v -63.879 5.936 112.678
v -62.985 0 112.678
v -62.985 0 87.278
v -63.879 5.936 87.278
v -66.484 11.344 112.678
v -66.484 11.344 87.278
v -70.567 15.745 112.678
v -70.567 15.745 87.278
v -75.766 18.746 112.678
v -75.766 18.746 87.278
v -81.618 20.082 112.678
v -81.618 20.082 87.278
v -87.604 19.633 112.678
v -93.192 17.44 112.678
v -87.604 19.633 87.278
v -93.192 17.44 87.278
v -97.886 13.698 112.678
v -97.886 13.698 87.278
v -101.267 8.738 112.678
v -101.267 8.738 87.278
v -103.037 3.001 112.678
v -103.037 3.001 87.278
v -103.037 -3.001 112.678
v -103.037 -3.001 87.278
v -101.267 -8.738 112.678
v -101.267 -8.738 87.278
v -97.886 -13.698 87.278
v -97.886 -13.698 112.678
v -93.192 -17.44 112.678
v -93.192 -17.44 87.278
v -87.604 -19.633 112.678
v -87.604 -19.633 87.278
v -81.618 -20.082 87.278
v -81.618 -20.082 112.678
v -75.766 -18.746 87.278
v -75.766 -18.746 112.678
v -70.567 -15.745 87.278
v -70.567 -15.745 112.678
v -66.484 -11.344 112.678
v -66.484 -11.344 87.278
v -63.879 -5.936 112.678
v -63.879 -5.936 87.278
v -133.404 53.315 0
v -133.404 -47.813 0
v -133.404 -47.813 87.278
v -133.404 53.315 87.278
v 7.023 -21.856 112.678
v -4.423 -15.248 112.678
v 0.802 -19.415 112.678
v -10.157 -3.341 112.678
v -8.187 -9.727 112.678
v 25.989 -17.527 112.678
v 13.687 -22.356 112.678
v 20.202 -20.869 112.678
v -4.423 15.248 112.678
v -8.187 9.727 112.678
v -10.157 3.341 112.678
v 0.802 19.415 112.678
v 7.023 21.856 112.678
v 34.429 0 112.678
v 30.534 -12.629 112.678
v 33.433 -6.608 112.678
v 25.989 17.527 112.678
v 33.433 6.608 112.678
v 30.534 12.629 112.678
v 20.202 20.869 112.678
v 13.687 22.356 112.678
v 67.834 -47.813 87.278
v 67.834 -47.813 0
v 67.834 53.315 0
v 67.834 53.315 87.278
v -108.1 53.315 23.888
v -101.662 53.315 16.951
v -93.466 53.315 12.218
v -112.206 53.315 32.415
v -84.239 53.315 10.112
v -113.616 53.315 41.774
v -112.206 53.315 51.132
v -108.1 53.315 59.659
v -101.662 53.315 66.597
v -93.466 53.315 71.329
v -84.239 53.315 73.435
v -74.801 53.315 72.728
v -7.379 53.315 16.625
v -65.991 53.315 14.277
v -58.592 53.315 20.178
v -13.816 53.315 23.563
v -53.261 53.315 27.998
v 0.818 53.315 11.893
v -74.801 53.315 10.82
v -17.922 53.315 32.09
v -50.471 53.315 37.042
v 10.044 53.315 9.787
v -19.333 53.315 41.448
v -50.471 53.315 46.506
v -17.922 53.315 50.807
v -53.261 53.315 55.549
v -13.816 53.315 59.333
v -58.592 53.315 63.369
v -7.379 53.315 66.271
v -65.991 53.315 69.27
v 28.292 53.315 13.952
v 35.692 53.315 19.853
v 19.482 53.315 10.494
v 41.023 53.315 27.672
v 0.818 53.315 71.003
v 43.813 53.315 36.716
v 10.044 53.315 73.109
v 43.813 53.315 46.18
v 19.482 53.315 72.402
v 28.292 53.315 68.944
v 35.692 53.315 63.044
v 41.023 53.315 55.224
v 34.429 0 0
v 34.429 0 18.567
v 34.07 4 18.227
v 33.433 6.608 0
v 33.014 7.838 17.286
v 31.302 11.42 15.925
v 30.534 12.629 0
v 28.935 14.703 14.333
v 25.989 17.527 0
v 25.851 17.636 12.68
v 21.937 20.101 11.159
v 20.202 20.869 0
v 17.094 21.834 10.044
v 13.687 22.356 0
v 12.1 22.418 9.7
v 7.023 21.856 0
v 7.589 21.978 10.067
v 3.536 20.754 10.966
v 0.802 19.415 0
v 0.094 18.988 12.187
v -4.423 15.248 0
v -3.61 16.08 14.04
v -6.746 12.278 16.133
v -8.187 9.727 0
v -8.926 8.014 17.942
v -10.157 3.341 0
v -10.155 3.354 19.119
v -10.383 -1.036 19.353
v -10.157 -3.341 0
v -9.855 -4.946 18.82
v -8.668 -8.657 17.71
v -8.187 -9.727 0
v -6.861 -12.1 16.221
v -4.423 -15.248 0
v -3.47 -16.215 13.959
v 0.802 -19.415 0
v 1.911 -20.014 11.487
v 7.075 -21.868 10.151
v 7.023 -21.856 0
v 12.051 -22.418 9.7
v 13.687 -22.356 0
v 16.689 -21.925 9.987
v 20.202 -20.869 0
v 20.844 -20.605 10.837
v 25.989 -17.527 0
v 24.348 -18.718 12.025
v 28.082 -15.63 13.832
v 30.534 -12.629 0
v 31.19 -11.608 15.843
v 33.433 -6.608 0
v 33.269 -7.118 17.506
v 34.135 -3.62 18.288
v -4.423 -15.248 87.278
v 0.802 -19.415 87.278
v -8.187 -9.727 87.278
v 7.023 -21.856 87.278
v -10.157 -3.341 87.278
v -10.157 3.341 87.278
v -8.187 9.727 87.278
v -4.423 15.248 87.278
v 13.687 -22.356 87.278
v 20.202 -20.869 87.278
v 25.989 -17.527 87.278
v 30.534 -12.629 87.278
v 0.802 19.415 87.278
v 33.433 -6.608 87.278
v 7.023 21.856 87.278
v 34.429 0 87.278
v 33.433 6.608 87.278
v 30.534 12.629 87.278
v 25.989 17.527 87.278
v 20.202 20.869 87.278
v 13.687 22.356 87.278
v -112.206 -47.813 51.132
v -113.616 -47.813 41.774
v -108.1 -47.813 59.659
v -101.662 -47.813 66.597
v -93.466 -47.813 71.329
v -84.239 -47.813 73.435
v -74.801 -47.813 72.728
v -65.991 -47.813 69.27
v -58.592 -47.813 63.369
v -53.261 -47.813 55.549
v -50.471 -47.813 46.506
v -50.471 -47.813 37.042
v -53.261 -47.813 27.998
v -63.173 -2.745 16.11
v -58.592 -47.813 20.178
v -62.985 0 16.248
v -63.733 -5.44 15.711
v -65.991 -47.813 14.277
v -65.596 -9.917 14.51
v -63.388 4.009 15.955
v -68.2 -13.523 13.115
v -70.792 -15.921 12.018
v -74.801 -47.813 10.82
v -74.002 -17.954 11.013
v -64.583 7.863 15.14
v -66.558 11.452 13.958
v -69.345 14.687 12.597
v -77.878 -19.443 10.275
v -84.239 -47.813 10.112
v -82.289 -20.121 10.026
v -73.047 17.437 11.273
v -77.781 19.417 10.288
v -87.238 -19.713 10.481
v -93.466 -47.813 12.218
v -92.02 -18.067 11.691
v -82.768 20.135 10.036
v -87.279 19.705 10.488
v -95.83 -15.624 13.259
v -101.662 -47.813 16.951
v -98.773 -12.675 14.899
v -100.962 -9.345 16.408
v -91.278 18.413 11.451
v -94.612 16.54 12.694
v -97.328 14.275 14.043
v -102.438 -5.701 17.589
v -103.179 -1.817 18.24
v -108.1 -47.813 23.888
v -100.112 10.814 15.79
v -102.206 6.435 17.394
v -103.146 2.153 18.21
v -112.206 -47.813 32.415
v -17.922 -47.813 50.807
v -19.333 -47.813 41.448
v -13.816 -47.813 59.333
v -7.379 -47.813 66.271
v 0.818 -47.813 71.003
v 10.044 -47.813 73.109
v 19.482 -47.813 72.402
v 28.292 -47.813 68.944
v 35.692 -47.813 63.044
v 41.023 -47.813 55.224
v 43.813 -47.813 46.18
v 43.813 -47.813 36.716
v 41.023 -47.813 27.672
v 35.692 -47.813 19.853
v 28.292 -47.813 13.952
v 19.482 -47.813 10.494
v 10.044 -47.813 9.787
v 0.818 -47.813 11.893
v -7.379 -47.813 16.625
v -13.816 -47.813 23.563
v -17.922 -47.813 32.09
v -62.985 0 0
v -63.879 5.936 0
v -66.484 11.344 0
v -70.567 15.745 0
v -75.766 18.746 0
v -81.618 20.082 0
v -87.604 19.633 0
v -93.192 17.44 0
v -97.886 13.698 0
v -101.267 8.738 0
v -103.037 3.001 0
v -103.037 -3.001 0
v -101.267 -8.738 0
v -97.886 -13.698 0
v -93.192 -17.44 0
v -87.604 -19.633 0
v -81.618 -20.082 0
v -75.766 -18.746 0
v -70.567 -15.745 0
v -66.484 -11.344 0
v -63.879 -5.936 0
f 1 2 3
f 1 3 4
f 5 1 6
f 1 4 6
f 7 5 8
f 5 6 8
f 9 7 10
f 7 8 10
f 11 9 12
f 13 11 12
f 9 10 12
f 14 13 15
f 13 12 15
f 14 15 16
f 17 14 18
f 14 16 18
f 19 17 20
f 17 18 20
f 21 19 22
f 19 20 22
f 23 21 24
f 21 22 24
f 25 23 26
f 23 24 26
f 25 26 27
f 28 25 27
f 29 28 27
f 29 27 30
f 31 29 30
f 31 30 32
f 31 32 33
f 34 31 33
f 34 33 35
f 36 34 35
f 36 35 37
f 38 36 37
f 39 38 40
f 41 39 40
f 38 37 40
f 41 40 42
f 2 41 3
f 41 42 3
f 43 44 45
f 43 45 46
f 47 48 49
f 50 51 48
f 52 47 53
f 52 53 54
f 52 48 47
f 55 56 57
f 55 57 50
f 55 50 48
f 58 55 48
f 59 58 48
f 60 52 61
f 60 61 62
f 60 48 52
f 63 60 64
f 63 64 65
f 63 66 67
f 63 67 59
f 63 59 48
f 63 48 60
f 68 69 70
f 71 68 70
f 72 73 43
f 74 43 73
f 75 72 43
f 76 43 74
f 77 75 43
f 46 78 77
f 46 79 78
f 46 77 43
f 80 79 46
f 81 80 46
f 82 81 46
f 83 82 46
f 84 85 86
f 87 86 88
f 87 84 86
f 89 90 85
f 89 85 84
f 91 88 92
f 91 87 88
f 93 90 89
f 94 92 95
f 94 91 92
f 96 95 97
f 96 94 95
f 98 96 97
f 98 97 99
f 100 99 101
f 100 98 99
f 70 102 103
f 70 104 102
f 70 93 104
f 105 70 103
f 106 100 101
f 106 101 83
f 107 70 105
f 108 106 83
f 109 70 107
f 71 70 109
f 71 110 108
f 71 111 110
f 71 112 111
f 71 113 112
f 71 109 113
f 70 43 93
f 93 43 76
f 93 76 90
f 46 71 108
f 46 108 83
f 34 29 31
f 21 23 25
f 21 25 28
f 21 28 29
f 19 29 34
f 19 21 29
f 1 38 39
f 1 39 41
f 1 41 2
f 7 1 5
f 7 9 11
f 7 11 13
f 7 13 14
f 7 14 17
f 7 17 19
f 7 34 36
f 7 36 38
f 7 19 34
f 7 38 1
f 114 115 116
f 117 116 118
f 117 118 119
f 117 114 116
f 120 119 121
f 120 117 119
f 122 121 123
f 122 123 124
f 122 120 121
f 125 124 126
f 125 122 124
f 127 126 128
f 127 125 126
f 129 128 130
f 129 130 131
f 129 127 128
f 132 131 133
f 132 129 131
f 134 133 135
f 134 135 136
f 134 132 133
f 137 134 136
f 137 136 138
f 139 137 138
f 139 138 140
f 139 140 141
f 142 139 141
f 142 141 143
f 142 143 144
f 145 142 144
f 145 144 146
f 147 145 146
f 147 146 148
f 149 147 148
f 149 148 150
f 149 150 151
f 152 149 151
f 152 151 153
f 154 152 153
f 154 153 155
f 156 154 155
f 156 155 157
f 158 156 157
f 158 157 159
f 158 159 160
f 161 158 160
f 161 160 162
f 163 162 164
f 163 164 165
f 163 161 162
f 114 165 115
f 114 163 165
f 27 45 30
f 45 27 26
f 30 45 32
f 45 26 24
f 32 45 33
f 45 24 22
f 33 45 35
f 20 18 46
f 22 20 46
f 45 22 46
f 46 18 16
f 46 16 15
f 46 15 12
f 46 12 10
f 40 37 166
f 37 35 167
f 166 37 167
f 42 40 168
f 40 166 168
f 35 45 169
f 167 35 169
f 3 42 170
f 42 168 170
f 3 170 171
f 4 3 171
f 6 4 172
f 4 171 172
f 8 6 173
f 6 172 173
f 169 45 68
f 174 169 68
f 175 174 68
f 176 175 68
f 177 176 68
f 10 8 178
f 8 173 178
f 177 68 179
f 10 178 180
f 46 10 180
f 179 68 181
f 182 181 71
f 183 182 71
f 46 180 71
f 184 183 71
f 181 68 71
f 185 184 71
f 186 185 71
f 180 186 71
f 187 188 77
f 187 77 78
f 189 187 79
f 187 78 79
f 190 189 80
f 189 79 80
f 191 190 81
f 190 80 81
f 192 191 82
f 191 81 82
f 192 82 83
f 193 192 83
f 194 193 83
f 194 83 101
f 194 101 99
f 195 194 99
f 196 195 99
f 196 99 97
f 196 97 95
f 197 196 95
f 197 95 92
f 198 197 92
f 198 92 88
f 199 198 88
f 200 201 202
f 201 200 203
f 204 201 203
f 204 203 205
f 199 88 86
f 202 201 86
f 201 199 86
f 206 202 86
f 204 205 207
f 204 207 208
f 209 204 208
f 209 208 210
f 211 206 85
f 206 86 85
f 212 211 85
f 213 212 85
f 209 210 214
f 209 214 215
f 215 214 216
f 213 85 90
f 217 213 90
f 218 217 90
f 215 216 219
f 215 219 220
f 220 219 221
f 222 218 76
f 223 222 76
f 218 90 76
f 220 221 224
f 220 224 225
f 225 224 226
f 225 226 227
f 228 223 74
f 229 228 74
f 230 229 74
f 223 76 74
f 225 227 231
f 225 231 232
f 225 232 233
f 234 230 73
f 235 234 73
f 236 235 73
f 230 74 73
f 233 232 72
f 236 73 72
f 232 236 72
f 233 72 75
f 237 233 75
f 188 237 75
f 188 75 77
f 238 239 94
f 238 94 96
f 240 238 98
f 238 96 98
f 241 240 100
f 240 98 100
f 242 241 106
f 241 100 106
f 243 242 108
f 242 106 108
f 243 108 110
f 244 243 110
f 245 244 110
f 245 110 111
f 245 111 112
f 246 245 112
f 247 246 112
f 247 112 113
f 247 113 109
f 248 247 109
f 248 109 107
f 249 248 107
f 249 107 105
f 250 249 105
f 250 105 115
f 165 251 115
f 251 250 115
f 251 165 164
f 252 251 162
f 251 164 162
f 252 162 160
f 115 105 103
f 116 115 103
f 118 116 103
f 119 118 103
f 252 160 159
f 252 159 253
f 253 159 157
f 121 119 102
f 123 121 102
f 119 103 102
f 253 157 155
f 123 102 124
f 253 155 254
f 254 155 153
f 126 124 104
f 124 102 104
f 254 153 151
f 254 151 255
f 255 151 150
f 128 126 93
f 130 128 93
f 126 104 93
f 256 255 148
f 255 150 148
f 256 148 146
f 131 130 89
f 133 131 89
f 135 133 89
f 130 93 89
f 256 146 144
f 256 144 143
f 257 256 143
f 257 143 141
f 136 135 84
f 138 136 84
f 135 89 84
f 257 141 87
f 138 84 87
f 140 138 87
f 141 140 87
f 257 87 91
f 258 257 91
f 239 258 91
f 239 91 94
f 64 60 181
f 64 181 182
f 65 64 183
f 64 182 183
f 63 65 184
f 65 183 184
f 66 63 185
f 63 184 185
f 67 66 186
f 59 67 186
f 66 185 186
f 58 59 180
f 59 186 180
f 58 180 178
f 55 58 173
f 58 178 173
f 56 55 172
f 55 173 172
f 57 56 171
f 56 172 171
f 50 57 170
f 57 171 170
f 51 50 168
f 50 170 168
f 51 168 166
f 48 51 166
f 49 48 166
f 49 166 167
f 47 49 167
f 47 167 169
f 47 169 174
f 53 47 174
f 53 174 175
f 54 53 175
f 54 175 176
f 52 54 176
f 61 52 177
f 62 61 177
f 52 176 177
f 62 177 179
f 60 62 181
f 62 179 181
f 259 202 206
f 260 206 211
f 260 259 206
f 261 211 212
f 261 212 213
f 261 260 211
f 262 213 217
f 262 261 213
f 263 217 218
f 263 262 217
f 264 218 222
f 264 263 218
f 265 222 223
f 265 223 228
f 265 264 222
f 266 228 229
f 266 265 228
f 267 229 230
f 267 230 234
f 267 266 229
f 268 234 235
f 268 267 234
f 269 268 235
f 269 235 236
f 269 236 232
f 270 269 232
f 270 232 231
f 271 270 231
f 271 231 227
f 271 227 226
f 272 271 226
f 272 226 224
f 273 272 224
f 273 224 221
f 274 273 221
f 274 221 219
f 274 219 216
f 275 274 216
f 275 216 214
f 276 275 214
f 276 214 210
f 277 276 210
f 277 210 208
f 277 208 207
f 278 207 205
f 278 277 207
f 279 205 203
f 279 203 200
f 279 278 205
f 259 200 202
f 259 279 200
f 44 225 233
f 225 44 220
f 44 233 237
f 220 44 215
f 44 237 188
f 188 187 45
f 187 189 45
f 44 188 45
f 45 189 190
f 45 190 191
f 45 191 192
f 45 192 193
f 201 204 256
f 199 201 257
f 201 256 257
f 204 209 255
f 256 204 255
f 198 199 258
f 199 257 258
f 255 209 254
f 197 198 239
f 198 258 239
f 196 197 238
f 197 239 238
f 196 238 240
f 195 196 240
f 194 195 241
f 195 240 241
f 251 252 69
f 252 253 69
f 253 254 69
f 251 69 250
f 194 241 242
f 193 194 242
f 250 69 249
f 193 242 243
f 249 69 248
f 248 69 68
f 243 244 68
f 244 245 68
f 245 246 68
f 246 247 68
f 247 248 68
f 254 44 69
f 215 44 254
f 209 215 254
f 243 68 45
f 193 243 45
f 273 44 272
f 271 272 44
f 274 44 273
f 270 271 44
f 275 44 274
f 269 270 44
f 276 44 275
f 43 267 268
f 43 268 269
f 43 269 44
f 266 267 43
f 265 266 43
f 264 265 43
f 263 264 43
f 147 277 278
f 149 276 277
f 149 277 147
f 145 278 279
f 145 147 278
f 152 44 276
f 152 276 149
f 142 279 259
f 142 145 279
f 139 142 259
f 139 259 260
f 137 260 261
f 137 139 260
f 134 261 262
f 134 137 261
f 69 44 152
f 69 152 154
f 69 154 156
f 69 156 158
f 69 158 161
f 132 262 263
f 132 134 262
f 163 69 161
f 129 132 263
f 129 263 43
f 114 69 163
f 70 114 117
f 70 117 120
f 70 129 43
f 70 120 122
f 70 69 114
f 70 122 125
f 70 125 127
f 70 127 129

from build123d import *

# Parameters (mm, degrees)
F0_W      = 141.2794664502
F0_H      = 101.1280715466
F1_DEPTH  = 87.2775018215
F2_DEPTH  = 59.9578022957
F4_R      = 22.4182284803
F5_DEPTH  = 25.4
F3_R      = 20.138408071
F6_DEPTH  = 25.4
F7_DEPTH  = 164.3640697002
F8_DEPTH  = 163.5153144598
F9_DEPTH  = 63.5
F10_DEPTH = 63.5
F11_DEPTH = 25.4
F12_DEPTH = 25.4
F14_D     = 63.5
F17_D     = 63.5


with BuildPart() as f1:
    # F0 (on Top) → F1 (new body)
    with BuildSketch(Plane.XY):
        with Locations((-2.8060041368, 2.750582993)):
            Rectangle(F0_W, F0_H)
    extrude(amount=F1_DEPTH)

    # F2 (add): a face of the model
    f2_faces = [f1.faces().sort_by_distance(p)[0] for p in [
        (-73.4457373619, 2.750582993, 43.6387509108),
    ]]
    extrude(f2_faces, amount=F2_DEPTH)

    # F4 (on face) → F5 (join)
    with BuildSketch(Plane.XY.offset(87.2775018215)):
        with Locations((12.0112225413, 0)):
            Circle(F4_R)
    extrude(amount=F5_DEPTH)

    # F3 (on face) → F6 (join)
    with BuildSketch(Plane.XY.offset(87.2775018215)):
        with Locations((-83.1232145429, 0)):
            Circle(F3_R)
    extrude(amount=F6_DEPTH)

    # F7 (add): a face of the model
    f7_faces = [f1.faces().sort_by_distance(p)[0] for p in [
        (12.0112225413, 0, 112.6775018215),
    ]]
    extrude(f7_faces, amount=-F7_DEPTH)

    # F8 (add): a face of the model
    f8_faces = [f1.faces().sort_by_distance(p)[0] for p in [
        (-83.1232145429, 0, 112.6775018215),
    ]]
    extrude(f8_faces, amount=-F8_DEPTH)

    # F9 (cut): a face of the model
    f9_faces = [f1.faces().sort_by_distance(p)[0] for p in [
        (-83.1232145429, 0, -50.8378126383),
    ]]
    extrude(f9_faces, amount=-F9_DEPTH, mode=Mode.SUBTRACT)

    # F10 (cut): a face of the model
    f10_faces = [f1.faces().sort_by_distance(p)[0] for p in [
        (12.0112225413, 0, -51.6865678787),
    ]]
    extrude(f10_faces, amount=-F10_DEPTH, mode=Mode.SUBTRACT)

    # F11 (cut): a face of the model
    f11_faces = [f1.faces().sort_by_distance(p)[0] for p in [
        (-83.1232145429, 0, 12.6621873617),
    ]]
    extrude(f11_faces, amount=-F11_DEPTH, mode=Mode.SUBTRACT)

    # F12 (cut): a face of the model
    f12_faces = [f1.faces().sort_by_distance(p)[0] for p in [
        (12.0112225413, 0, 11.8134321213),
    ]]
    extrude(f12_faces, amount=-F12_DEPTH, mode=Mode.SUBTRACT)

    # F14 (through all)
    with Locations(Plane.XZ.offset(47.8134527802)):
        with Locations((12.4171413481, 41.448071599)):
            Hole(F14_D / 2)

    # F17 (through all)
    with Locations(Plane.XZ.offset(47.8134527802)):
        with Locations((-81.8664953113, 41.7736619711)):
            Hole(F17_D / 2)


solid = f1.part
